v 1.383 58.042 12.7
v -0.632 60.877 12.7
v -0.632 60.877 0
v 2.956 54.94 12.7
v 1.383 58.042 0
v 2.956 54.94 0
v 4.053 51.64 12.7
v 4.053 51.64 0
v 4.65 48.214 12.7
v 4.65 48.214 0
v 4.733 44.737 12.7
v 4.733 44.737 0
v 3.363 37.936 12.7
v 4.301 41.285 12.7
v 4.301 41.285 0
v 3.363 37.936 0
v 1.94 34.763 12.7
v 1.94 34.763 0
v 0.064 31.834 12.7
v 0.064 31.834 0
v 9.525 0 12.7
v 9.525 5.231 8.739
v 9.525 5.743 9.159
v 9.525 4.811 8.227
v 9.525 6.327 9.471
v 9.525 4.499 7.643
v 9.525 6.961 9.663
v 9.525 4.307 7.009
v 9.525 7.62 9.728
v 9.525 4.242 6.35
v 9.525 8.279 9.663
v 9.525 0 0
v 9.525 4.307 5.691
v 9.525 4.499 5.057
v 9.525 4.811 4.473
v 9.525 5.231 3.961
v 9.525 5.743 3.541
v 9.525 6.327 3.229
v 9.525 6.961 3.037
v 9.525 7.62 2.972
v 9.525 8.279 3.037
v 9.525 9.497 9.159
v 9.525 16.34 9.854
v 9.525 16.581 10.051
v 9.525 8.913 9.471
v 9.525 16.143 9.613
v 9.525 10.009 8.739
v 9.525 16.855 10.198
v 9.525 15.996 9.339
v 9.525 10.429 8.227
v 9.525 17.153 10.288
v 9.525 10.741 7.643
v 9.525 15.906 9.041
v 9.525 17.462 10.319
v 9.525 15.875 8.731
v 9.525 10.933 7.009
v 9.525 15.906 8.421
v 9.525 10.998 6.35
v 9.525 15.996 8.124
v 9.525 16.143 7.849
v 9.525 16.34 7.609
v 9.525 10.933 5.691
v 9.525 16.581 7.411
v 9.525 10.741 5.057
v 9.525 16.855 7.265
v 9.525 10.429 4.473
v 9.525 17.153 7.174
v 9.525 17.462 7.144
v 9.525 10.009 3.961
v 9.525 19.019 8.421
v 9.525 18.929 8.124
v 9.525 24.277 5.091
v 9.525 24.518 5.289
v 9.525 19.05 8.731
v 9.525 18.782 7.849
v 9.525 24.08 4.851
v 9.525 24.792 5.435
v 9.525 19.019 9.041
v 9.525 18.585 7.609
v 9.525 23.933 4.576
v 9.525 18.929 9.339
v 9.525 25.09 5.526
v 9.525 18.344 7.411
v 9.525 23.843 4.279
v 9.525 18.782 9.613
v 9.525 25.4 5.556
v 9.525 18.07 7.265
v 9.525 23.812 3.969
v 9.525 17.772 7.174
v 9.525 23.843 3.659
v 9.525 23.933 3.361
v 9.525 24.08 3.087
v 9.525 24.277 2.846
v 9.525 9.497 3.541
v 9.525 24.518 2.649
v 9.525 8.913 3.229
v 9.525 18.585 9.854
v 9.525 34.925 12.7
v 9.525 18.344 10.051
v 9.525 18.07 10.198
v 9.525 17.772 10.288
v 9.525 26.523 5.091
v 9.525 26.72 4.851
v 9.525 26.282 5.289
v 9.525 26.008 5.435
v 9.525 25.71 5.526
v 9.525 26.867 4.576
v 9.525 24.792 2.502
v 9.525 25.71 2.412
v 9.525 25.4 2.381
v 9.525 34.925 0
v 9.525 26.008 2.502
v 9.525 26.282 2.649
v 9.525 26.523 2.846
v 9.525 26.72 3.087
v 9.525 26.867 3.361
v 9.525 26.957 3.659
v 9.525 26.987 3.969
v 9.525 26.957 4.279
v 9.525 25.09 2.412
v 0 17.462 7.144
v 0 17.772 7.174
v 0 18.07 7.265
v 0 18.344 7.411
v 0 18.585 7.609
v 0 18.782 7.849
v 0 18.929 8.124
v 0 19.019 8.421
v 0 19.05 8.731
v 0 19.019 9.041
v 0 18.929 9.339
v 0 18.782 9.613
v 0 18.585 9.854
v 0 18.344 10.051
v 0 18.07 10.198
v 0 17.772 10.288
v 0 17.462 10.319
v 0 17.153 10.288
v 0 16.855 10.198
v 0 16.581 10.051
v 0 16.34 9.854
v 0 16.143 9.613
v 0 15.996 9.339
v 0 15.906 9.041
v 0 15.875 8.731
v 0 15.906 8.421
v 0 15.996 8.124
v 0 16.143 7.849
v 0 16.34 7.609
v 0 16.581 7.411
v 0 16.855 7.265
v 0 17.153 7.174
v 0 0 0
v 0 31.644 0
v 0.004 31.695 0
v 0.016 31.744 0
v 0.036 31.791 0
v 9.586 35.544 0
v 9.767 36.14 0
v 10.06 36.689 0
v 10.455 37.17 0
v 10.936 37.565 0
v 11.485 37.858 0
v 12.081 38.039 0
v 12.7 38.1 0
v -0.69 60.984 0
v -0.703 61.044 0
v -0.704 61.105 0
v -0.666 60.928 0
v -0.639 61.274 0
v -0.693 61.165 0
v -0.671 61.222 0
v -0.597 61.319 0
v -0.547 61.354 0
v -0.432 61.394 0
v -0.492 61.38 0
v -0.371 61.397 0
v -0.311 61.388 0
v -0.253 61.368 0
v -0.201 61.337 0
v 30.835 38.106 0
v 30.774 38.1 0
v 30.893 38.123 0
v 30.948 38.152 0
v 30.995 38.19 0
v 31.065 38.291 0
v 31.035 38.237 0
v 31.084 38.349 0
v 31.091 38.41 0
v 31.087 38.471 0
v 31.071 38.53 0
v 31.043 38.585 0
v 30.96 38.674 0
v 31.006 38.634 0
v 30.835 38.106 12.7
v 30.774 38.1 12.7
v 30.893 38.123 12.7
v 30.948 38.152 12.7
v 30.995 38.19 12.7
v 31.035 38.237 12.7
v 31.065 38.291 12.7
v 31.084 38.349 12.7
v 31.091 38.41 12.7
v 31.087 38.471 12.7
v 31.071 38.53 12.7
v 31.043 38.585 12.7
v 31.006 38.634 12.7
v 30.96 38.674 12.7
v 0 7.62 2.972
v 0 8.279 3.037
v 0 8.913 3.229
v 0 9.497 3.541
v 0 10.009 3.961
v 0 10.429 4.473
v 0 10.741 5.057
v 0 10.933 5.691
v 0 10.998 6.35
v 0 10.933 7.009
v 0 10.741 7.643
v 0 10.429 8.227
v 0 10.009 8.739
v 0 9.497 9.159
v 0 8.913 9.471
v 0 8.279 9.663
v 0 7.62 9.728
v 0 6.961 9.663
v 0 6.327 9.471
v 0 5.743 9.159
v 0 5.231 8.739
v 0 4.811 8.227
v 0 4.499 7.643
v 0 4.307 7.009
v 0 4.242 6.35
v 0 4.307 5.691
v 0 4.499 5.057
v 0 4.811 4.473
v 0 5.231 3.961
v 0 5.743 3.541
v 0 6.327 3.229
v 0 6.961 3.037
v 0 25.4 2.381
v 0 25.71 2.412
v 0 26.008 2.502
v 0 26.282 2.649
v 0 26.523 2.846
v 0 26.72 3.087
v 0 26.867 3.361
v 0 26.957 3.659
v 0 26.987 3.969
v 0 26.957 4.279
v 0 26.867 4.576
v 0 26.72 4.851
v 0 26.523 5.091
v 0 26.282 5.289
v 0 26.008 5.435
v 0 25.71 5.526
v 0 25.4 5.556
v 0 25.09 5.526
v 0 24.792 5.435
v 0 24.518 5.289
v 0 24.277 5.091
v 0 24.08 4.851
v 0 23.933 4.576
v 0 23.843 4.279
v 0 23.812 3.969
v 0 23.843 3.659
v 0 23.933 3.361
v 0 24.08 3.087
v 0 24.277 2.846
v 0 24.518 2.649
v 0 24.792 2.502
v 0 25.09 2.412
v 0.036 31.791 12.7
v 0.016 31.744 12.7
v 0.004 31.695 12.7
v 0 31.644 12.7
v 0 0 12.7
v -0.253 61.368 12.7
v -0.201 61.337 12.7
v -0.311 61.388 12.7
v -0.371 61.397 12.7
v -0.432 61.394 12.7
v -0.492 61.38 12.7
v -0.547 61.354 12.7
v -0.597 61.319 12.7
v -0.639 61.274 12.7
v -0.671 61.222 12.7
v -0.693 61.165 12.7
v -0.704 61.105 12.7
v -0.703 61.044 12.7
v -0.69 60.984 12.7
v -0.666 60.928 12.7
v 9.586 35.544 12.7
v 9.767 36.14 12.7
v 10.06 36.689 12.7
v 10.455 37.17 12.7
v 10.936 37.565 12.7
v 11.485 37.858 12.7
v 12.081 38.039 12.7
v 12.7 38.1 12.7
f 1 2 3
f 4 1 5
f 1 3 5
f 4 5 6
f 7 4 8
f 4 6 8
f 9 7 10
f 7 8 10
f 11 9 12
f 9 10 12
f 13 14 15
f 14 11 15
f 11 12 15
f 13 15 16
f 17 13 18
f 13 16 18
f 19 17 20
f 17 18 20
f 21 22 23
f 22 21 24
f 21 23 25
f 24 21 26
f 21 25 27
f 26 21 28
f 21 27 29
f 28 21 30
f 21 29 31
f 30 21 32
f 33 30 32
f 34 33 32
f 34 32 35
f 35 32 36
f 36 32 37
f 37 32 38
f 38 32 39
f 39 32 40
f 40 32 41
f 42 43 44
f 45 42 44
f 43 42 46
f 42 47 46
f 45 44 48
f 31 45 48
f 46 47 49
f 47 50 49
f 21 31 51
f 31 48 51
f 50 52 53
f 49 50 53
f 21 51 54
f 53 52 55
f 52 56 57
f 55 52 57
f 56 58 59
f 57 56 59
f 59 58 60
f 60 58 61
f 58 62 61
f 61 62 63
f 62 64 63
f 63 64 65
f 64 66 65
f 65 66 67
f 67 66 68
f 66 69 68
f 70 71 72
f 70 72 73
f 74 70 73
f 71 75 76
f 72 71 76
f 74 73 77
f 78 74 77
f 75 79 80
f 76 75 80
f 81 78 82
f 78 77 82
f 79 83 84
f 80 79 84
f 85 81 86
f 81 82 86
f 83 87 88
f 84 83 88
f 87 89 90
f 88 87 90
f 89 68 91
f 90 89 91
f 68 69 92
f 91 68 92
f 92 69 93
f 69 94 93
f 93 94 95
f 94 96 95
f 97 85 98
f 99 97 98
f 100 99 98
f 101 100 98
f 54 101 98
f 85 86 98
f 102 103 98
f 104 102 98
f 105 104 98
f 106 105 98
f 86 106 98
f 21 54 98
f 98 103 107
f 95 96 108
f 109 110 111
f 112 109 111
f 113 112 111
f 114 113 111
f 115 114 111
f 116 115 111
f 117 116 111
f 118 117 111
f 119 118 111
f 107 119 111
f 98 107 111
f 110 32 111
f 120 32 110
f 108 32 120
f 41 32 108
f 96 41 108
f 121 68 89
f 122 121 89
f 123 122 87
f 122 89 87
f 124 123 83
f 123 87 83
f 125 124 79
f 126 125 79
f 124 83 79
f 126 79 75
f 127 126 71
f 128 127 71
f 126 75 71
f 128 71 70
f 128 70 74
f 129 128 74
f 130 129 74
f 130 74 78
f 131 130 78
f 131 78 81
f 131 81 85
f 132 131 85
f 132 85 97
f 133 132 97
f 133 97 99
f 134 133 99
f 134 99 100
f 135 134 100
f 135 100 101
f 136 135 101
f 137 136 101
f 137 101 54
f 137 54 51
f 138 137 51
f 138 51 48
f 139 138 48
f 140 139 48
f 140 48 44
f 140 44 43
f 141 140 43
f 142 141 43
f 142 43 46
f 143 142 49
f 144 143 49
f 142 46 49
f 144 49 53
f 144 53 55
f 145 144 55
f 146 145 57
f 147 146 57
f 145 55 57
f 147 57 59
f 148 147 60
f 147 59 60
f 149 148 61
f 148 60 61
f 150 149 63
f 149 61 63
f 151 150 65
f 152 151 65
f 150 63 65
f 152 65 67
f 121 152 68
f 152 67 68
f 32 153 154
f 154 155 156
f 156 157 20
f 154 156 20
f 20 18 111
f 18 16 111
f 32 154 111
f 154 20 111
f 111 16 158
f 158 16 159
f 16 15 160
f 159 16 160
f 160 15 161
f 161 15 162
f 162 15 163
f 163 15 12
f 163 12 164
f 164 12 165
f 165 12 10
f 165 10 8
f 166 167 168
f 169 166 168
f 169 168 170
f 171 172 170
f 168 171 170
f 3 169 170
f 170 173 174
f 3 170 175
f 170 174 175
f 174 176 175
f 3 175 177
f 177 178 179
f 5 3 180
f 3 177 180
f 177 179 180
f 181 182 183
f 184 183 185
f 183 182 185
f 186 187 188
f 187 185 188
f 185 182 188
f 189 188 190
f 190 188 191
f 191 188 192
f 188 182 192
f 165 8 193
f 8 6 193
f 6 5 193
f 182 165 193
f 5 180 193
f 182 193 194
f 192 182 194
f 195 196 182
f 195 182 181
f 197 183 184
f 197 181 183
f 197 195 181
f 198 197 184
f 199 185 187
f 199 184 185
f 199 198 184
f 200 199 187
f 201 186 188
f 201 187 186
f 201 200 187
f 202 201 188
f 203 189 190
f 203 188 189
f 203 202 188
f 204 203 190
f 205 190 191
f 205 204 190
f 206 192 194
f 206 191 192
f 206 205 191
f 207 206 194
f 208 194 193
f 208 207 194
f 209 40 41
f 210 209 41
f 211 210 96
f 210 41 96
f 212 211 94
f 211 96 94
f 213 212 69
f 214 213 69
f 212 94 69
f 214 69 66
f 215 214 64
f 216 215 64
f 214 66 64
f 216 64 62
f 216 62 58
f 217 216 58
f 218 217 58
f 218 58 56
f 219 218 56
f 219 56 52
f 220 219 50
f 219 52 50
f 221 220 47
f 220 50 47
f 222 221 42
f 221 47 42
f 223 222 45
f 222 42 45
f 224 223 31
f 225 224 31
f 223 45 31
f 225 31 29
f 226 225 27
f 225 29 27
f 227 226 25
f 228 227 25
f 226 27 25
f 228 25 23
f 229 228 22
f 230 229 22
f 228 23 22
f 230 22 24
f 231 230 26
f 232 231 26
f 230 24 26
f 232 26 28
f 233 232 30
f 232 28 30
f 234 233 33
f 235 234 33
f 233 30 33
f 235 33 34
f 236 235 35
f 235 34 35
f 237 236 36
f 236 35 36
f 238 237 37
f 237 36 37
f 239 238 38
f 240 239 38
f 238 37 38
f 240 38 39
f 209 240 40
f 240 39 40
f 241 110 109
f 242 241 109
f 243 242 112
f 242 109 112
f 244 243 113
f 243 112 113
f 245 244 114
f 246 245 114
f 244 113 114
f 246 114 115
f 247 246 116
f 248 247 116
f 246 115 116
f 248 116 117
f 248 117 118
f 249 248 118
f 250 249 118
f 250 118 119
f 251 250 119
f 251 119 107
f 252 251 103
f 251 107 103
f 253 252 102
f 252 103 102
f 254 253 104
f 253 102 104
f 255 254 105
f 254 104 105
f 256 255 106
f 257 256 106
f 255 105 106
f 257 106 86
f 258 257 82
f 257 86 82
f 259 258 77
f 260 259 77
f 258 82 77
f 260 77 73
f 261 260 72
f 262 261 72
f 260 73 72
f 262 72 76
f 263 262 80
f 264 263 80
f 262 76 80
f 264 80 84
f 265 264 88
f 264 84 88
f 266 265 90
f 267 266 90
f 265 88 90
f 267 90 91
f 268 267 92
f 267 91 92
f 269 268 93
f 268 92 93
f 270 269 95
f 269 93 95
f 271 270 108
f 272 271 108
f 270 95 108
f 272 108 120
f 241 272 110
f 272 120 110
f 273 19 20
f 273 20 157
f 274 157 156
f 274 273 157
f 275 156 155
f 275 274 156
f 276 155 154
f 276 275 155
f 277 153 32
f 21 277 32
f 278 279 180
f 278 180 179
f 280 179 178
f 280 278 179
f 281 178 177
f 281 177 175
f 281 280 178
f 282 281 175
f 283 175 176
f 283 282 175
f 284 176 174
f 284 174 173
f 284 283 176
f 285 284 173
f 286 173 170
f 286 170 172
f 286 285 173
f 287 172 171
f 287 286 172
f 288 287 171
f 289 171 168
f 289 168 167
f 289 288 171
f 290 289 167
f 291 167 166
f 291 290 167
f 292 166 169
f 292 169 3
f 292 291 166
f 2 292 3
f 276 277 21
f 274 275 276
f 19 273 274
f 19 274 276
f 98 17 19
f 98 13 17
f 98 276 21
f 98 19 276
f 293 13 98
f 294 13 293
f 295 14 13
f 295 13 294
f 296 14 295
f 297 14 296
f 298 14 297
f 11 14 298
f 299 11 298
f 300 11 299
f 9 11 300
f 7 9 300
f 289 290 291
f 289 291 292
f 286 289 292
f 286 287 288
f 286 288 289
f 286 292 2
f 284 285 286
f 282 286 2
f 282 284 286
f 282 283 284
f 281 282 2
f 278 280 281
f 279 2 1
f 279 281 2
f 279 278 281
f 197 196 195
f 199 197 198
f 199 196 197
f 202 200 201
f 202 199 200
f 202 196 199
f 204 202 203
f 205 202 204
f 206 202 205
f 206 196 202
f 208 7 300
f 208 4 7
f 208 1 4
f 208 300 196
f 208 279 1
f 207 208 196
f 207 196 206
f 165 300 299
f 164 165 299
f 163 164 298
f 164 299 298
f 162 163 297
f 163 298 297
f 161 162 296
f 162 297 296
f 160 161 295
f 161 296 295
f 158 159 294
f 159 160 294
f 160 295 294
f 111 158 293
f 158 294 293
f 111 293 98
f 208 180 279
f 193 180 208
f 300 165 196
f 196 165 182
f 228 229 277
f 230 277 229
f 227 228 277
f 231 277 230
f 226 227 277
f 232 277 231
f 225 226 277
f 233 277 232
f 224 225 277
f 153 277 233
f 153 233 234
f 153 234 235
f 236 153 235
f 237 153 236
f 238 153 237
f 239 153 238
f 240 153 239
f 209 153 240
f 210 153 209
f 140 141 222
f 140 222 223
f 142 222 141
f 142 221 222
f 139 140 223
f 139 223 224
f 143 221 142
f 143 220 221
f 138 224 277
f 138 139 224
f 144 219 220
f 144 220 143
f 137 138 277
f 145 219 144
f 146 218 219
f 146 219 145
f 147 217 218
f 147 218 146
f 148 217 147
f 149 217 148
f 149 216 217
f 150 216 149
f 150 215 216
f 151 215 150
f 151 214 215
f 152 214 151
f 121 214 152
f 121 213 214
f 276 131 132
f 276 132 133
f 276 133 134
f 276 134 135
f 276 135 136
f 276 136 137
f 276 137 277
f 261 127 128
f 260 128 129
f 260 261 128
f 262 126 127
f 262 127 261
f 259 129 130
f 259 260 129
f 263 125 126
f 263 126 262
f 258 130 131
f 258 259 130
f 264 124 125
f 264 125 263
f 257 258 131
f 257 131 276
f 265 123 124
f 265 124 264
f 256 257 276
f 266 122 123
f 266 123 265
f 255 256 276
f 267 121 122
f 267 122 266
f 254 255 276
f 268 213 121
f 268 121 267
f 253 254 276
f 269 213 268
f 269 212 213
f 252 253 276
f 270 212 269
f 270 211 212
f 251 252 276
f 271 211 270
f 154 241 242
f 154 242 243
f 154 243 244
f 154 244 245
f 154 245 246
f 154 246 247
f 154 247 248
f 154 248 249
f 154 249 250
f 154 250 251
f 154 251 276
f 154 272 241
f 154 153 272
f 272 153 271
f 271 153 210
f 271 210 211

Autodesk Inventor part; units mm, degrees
ref_plane "YZ Plane" through (0, 0, 0) normal (1, 0, 0) x (0, 1, 0)
ref_plane "XZ Plane" through (0, 0, 0) normal (0, 1, 0) x (-1, 0, 0)
ref_plane "XY Plane" through (0, 0, 0) normal (0, 0, 1) x (1, 0, 0)
sketch "Sketch1" plane through (0, 0, 0) normal (0, 0, 1) x (1, 0, 0)
  line L0 (0, 0) -> (9.525, 0)
  line L1 (9.525, 0) -> (9.525, 38.1)
  line L2 (9.525, 38.1) -> (31.75, 38.1)
  line L3 (0, 0) -> (0, 63.5) construction
  line L4 (0, 63.5) -> (-3.175, 63.5) construction
  line L5 (-3.175, 63.5) -> (31.75, 38.1)
  line L6 (0, 0) -> (0, 31.75)
  line L7 (4.7625, 0) -> (4.7625, 100.076) construction
  arc A0 (0, 31.75) -> (-3.175, 63.5) centre (-18.6849, 45.9153) ccw
  dimension "d0" = 9.525
  dimension "d1" = 38.1
  dimension "d2" = 22.225
  dimension "d3" = 63.5
  dimension "d4" = 3.175
  dimension "d5" = 4.7625
extrude "Extrusion1" add sketch "Sketch1" along normal blind 12.7
sketch "Sketch2" plane through (9.525, 0, 0) normal (1, 0, 0) x (0, 0, -1)
  line L0 (0, 0) -> (0, 38.1) projected
  line L1 (0, 0) -> (-12.7, 0) projected
  circle A0 centre (-6.35, 7.62) radius 3.3782
  circle A1 centre (-3.9688, 25.4) radius 1.5875
  circle A2 centre (-8.7312, 17.4625) radius 1.5875
  dimension "d8" = 6.7564
  dimension "d10" = 6.35
  dimension "d11" = 7.62
  dimension "d12" = 3.175
  dimension "d13" = 3.175
  dimension "d15" = 4.7625
  dimension "d16" = 3.9688
  dimension "d17" = 25.4
  dimension "d24" = 7.9375
extrude "Extrusion2" cut sketch "Sketch2" against normal blind 12.7
fillet "Fillet1" radius 3.175 1 edges at (9.525, 38.1, 6.35)
fillet "Fillet2" radius 0.3175 1 edges at (-3.175, 63.5, 6.35)
fillet "Fillet3" radius 0.3175 1 edges at (0, 31.75, 6.35)
fillet "Fillet4" radius 0.3175 1 edges at (31.75, 38.1, 6.35)
properties part number "Rebuild Puller Hook" material "Polycarbonate, Clear"
